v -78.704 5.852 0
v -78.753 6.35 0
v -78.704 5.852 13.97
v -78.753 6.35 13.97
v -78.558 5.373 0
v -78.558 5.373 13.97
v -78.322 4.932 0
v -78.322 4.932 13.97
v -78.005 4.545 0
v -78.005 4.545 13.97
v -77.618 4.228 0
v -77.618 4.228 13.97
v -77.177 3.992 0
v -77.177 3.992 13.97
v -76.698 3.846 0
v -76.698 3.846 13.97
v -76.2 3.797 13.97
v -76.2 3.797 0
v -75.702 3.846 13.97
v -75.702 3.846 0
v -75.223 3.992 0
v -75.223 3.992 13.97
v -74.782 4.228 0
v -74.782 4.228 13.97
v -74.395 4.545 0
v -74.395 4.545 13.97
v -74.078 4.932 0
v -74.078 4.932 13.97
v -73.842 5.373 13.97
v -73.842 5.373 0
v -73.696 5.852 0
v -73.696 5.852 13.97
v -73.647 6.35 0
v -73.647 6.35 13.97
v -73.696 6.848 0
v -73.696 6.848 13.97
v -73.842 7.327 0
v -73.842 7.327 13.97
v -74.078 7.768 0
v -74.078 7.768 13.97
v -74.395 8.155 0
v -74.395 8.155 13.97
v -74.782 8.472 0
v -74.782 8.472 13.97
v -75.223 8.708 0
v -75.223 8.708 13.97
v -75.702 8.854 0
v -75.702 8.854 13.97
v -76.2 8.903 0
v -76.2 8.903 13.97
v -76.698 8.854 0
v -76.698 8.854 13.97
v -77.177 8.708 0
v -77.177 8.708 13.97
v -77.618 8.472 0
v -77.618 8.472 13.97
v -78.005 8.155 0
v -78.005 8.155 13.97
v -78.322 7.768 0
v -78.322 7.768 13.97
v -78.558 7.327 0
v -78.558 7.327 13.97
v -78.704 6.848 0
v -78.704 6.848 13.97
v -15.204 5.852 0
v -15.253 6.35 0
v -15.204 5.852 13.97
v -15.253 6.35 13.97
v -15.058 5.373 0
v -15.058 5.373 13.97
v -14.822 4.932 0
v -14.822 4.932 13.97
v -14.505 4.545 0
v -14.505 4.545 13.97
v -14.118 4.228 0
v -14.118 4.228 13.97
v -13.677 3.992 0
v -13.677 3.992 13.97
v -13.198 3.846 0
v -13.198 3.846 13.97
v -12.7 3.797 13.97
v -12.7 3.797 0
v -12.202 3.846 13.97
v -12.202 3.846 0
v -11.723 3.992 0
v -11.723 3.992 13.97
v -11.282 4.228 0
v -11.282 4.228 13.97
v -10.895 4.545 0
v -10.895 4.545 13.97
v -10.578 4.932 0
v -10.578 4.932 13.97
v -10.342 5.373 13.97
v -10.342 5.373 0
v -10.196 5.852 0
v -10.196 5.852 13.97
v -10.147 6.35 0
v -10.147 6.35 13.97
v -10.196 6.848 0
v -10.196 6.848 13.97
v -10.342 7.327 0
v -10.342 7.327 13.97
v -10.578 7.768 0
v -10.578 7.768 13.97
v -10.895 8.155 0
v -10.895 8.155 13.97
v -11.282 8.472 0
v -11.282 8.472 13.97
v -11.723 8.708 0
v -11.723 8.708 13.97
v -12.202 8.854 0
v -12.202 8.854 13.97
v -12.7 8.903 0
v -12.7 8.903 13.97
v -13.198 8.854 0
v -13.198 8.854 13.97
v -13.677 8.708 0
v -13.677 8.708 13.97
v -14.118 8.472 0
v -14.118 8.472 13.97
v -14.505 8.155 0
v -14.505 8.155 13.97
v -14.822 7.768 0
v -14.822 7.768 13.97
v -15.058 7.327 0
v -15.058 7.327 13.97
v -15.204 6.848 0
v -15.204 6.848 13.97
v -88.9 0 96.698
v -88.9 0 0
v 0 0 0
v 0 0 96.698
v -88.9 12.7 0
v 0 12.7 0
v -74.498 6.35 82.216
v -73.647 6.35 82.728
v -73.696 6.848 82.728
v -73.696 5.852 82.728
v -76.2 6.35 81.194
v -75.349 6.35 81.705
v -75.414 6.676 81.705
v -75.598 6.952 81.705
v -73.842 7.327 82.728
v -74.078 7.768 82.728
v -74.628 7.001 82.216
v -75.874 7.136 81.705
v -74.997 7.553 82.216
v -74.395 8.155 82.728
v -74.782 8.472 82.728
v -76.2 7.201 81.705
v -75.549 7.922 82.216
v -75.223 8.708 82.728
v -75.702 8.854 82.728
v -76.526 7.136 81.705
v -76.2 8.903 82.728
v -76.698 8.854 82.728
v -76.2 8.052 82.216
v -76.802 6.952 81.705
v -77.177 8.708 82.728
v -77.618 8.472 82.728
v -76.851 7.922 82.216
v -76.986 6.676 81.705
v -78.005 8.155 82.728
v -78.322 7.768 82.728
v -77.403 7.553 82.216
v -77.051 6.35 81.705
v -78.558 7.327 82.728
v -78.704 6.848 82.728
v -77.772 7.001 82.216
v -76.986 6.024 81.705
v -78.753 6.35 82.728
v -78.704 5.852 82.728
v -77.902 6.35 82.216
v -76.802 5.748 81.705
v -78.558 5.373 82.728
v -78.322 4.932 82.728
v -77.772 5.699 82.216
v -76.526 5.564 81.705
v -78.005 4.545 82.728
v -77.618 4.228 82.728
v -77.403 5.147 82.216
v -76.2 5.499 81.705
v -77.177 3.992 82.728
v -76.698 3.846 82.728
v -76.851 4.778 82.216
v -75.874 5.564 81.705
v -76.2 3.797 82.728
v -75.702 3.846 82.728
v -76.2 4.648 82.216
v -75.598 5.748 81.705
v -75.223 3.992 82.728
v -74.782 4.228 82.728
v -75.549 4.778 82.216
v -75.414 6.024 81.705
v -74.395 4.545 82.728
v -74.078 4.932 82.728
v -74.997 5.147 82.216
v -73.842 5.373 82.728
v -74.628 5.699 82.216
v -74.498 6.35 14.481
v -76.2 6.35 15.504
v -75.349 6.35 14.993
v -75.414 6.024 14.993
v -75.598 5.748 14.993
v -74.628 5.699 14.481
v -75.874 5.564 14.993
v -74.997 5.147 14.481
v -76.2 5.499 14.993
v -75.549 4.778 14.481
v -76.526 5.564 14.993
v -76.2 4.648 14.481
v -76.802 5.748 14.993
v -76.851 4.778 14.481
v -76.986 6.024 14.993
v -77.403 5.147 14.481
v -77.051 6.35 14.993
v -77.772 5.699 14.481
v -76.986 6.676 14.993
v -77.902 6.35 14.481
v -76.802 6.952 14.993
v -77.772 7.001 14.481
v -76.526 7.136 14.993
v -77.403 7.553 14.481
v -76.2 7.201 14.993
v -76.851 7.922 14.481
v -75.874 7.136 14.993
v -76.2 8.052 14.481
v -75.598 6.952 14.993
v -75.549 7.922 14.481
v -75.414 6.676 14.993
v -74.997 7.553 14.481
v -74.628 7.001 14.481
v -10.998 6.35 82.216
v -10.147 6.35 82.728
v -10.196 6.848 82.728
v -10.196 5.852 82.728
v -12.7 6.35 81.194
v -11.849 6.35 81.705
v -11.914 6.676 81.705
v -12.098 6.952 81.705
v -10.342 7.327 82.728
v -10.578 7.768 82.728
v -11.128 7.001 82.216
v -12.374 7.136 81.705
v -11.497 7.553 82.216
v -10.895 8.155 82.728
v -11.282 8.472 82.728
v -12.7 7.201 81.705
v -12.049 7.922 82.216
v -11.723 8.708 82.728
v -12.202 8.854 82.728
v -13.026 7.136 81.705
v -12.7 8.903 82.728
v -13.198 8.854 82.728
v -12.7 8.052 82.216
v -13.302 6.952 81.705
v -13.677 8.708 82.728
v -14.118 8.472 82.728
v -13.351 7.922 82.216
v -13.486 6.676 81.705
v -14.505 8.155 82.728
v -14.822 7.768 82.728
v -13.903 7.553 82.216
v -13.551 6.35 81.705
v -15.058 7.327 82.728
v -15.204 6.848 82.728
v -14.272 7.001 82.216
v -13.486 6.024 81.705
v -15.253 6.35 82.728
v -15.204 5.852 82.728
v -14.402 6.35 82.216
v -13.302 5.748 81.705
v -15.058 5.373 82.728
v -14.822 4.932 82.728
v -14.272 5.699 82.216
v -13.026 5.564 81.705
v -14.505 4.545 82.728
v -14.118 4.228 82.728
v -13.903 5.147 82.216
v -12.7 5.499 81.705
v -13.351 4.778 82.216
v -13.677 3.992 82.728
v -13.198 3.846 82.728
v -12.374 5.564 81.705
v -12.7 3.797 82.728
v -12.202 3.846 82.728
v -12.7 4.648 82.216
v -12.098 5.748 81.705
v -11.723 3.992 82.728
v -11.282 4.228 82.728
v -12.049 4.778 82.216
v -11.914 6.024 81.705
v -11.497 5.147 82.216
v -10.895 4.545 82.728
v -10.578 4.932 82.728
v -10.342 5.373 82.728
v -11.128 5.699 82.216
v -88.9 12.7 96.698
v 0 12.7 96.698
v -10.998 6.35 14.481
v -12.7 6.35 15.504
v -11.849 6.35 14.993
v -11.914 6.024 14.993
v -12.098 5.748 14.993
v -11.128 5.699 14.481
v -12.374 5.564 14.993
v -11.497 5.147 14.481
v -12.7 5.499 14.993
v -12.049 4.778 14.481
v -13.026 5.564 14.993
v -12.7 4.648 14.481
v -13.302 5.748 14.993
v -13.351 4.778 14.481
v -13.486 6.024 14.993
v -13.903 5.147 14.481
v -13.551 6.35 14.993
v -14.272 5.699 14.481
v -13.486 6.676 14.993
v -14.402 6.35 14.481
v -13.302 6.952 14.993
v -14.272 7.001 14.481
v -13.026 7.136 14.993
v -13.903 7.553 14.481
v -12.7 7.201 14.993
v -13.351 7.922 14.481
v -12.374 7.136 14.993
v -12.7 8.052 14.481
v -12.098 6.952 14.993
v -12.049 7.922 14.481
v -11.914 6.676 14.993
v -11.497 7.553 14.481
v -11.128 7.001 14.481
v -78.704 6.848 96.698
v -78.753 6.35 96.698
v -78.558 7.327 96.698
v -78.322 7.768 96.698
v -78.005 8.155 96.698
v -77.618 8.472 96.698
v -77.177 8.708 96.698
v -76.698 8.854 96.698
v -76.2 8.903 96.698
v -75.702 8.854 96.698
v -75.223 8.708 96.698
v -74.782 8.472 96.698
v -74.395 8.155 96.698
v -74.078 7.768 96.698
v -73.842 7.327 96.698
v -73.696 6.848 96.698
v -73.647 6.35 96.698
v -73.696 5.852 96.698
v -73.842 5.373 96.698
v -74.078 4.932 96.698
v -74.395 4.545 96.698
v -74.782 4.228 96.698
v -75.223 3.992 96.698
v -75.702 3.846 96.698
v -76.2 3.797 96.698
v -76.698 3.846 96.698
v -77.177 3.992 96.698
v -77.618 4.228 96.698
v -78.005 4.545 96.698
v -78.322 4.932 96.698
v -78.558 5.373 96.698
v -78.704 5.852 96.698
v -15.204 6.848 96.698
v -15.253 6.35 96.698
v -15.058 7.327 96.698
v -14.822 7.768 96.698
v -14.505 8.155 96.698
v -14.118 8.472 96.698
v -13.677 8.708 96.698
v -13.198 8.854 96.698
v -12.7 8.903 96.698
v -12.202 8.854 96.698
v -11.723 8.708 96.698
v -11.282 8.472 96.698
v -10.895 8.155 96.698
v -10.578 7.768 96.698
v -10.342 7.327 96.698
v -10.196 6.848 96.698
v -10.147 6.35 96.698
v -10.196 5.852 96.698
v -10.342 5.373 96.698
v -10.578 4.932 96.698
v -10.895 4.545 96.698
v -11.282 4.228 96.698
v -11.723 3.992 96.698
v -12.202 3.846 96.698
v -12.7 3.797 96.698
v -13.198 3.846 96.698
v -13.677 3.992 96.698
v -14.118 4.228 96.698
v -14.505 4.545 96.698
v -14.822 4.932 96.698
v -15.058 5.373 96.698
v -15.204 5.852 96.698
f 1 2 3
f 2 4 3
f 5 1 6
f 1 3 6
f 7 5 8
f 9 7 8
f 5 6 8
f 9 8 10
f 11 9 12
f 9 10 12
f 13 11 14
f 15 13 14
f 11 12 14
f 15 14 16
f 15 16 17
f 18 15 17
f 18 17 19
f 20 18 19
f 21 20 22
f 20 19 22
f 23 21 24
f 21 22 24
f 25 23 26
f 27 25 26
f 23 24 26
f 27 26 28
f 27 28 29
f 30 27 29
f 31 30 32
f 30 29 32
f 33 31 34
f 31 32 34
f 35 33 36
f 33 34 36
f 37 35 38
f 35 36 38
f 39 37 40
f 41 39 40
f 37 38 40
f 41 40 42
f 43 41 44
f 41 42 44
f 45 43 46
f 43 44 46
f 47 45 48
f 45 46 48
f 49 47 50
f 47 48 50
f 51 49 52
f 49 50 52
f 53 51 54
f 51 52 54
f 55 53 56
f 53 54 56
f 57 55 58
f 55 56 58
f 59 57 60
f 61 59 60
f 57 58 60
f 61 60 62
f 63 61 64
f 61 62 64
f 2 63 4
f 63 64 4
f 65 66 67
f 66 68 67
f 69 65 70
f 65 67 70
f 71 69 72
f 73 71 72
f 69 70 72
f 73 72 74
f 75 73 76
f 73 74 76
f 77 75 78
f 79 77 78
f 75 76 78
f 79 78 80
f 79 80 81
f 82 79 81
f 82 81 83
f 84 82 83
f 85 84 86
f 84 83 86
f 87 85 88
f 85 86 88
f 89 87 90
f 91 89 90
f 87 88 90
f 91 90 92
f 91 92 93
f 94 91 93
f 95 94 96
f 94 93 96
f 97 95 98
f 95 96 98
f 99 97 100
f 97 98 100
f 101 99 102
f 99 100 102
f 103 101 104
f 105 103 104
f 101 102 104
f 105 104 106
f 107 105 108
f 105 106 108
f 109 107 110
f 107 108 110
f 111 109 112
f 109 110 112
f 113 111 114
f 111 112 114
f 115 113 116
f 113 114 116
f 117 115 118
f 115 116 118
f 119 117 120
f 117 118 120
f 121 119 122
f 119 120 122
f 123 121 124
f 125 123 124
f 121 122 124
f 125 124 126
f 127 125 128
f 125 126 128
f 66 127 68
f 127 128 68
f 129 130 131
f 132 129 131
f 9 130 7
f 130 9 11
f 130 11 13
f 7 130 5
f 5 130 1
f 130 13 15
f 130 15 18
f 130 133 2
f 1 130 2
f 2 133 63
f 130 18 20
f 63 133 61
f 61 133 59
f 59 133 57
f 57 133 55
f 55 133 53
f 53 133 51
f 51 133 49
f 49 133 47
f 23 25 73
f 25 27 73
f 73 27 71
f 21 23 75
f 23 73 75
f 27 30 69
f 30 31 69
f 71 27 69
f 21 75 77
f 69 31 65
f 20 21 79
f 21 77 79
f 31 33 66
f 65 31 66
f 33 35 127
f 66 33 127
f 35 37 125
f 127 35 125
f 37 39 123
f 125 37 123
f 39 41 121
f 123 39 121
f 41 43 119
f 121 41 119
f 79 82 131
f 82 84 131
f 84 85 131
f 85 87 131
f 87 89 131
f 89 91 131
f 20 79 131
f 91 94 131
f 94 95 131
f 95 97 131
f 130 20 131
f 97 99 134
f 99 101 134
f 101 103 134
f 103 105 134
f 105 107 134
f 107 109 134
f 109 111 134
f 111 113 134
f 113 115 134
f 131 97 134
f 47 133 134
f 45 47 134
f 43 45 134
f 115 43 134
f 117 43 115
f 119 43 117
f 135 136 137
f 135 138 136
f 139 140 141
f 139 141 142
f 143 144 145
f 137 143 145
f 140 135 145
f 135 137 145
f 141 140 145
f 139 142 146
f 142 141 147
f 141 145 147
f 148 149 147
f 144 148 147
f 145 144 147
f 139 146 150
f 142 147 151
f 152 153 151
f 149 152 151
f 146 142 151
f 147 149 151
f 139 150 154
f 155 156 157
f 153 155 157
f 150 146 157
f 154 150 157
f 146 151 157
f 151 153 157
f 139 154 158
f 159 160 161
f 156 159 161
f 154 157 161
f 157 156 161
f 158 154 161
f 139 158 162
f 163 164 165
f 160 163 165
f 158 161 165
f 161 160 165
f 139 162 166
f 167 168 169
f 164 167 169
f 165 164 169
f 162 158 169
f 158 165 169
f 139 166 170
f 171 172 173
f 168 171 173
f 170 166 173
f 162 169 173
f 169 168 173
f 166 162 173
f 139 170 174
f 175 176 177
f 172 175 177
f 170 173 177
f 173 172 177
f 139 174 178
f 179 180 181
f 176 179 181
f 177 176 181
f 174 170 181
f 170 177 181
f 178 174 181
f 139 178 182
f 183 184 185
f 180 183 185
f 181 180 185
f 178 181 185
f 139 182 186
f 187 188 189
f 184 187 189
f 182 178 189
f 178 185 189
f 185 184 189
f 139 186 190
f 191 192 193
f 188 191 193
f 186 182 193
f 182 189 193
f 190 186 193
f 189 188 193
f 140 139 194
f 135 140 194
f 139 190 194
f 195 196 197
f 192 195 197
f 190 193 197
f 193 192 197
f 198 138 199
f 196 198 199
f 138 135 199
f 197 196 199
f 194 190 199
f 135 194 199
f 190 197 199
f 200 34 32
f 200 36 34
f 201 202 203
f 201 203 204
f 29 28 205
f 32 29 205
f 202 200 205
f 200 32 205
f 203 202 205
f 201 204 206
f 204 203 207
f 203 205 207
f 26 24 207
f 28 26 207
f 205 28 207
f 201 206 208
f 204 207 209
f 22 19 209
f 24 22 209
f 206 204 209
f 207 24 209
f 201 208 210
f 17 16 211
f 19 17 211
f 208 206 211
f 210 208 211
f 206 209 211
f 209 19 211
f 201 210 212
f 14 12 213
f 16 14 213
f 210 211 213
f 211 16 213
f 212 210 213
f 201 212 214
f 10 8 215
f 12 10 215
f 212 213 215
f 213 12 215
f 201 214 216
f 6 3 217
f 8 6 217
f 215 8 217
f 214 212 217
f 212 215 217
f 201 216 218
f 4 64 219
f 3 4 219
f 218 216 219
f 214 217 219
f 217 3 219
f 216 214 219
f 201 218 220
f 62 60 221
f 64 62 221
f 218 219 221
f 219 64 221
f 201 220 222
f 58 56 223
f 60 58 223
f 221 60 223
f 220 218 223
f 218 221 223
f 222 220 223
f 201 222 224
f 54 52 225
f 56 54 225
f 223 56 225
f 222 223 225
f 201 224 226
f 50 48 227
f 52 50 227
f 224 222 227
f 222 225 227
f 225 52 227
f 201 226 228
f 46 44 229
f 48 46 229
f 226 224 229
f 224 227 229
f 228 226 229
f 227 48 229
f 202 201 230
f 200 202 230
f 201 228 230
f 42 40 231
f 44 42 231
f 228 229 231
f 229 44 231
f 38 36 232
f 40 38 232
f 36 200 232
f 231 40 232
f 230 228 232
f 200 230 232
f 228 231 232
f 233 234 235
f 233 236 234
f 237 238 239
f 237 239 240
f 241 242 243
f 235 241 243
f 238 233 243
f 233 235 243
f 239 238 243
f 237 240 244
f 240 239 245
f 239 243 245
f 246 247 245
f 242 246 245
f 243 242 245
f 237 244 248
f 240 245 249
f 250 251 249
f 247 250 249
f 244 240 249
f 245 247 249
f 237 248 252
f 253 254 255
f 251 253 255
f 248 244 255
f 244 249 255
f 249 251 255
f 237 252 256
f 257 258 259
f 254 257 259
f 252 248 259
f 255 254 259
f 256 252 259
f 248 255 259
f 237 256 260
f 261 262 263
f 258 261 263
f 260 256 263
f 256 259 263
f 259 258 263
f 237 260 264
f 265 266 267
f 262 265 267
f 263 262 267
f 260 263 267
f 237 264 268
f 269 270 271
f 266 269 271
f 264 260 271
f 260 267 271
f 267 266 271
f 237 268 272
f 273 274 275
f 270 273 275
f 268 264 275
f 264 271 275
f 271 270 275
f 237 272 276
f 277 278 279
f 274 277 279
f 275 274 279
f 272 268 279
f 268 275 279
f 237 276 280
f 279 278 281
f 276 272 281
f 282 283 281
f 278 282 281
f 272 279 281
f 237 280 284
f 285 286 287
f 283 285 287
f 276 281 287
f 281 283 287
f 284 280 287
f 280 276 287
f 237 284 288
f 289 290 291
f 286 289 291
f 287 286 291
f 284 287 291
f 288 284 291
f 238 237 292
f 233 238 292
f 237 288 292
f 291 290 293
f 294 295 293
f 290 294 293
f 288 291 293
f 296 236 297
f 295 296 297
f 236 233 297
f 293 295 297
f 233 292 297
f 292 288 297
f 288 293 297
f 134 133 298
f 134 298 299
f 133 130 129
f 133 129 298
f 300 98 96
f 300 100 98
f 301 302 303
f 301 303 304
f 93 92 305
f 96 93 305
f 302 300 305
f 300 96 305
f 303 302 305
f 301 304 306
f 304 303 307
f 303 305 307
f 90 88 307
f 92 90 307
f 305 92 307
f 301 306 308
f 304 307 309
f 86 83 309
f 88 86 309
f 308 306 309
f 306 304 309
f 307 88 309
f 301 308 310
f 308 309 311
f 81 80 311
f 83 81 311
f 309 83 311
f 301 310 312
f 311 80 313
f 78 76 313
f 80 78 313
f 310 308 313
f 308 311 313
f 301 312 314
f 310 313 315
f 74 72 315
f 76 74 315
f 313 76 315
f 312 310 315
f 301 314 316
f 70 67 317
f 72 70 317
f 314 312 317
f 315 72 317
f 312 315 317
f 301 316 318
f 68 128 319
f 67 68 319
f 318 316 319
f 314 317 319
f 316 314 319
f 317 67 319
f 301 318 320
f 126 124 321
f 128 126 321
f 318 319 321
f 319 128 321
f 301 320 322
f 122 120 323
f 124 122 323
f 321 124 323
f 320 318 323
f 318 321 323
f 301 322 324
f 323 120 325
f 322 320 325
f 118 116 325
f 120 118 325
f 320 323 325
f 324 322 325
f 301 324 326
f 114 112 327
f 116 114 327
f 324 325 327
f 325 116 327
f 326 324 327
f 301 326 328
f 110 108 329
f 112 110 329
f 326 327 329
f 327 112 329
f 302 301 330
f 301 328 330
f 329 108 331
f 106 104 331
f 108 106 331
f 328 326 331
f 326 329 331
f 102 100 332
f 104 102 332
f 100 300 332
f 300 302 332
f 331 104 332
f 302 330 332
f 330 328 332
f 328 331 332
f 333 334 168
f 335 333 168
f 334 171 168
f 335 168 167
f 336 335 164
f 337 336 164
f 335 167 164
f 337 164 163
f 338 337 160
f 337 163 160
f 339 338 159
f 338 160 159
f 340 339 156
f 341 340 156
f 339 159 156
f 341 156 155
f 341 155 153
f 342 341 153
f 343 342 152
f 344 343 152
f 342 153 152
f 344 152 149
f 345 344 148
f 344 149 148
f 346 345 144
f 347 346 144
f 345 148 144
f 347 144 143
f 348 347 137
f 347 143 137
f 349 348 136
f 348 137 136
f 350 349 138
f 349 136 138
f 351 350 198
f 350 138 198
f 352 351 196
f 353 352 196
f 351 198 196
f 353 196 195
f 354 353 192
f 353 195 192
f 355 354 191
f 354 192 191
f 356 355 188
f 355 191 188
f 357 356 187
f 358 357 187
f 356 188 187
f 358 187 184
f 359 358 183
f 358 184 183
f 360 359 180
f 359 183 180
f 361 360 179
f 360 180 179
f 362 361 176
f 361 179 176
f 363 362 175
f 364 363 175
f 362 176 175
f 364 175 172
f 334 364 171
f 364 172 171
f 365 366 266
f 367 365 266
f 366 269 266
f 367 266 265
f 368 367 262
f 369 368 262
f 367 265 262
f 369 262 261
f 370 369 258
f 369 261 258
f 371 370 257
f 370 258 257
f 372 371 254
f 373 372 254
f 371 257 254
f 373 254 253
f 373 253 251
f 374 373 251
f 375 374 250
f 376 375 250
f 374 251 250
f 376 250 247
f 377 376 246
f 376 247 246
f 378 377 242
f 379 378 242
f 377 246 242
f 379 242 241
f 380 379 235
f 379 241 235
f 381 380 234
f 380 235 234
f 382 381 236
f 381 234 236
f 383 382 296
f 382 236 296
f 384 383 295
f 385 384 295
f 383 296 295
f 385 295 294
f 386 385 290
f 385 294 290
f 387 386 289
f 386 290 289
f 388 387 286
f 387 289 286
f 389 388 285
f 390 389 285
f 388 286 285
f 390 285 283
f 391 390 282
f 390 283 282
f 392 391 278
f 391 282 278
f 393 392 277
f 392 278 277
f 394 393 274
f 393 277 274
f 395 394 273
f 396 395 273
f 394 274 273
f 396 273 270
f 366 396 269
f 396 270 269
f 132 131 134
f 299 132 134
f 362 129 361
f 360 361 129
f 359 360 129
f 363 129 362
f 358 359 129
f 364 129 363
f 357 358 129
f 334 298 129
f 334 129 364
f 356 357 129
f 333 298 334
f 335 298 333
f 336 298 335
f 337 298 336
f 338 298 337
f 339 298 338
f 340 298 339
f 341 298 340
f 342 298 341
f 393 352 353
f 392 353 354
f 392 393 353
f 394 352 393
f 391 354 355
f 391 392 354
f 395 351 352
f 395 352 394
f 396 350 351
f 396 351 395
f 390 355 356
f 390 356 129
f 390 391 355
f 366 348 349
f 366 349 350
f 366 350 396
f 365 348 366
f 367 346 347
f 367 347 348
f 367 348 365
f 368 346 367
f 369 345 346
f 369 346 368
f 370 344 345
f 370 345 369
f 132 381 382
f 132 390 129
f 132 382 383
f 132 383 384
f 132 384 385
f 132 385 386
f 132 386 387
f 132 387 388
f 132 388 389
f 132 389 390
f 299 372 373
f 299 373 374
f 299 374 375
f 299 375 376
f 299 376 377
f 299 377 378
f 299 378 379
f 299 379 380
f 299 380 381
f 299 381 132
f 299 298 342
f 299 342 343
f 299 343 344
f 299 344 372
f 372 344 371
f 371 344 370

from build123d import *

# Parameters (mm, degrees)
F0_W     = 88.9
F0_H     = 12.7
F1_DEPTH = 96.6975968
F3_D     = 5.1054
F3_DEPTH = 13.97
F3_TIP   = 1.5338169022
F5_D     = 5.1054
F5_DEPTH = 13.97
F5_TIP   = 1.5338169022


with BuildPart() as f1:
    # F0 (on Top) → F1 (new body)
    with BuildSketch(Plane.XY):
        with Locations((-44.45, 6.35)):
            Rectangle(F0_W, F0_H)
    extrude(amount=F1_DEPTH)

    # F3
    with Locations(Plane.XY.offset(96.6975968)):
        with Locations((-76.2, 6.35), (-12.7, 6.35)):
            Hole(F3_D / 2, depth=F3_DEPTH)
            with Locations((0, 0, -(F3_DEPTH + F3_TIP / 2))):  # 118° drill point
                Cone(0, F3_D / 2, F3_TIP, mode=Mode.SUBTRACT)

    # F5
    with Locations(Plane(origin=(0, 0, 0), x_dir=(1, 0, 0), z_dir=(0, 0, -1))):
        with Locations((-76.2, -6.35), (-12.7, -6.35)):
            Hole(F5_D / 2, depth=F5_DEPTH)
            with Locations((0, 0, -(F5_DEPTH + F5_TIP / 2))):  # 118° drill point
                Cone(0, F5_D / 2, F5_TIP, mode=Mode.SUBTRACT)


solid = f1.part
